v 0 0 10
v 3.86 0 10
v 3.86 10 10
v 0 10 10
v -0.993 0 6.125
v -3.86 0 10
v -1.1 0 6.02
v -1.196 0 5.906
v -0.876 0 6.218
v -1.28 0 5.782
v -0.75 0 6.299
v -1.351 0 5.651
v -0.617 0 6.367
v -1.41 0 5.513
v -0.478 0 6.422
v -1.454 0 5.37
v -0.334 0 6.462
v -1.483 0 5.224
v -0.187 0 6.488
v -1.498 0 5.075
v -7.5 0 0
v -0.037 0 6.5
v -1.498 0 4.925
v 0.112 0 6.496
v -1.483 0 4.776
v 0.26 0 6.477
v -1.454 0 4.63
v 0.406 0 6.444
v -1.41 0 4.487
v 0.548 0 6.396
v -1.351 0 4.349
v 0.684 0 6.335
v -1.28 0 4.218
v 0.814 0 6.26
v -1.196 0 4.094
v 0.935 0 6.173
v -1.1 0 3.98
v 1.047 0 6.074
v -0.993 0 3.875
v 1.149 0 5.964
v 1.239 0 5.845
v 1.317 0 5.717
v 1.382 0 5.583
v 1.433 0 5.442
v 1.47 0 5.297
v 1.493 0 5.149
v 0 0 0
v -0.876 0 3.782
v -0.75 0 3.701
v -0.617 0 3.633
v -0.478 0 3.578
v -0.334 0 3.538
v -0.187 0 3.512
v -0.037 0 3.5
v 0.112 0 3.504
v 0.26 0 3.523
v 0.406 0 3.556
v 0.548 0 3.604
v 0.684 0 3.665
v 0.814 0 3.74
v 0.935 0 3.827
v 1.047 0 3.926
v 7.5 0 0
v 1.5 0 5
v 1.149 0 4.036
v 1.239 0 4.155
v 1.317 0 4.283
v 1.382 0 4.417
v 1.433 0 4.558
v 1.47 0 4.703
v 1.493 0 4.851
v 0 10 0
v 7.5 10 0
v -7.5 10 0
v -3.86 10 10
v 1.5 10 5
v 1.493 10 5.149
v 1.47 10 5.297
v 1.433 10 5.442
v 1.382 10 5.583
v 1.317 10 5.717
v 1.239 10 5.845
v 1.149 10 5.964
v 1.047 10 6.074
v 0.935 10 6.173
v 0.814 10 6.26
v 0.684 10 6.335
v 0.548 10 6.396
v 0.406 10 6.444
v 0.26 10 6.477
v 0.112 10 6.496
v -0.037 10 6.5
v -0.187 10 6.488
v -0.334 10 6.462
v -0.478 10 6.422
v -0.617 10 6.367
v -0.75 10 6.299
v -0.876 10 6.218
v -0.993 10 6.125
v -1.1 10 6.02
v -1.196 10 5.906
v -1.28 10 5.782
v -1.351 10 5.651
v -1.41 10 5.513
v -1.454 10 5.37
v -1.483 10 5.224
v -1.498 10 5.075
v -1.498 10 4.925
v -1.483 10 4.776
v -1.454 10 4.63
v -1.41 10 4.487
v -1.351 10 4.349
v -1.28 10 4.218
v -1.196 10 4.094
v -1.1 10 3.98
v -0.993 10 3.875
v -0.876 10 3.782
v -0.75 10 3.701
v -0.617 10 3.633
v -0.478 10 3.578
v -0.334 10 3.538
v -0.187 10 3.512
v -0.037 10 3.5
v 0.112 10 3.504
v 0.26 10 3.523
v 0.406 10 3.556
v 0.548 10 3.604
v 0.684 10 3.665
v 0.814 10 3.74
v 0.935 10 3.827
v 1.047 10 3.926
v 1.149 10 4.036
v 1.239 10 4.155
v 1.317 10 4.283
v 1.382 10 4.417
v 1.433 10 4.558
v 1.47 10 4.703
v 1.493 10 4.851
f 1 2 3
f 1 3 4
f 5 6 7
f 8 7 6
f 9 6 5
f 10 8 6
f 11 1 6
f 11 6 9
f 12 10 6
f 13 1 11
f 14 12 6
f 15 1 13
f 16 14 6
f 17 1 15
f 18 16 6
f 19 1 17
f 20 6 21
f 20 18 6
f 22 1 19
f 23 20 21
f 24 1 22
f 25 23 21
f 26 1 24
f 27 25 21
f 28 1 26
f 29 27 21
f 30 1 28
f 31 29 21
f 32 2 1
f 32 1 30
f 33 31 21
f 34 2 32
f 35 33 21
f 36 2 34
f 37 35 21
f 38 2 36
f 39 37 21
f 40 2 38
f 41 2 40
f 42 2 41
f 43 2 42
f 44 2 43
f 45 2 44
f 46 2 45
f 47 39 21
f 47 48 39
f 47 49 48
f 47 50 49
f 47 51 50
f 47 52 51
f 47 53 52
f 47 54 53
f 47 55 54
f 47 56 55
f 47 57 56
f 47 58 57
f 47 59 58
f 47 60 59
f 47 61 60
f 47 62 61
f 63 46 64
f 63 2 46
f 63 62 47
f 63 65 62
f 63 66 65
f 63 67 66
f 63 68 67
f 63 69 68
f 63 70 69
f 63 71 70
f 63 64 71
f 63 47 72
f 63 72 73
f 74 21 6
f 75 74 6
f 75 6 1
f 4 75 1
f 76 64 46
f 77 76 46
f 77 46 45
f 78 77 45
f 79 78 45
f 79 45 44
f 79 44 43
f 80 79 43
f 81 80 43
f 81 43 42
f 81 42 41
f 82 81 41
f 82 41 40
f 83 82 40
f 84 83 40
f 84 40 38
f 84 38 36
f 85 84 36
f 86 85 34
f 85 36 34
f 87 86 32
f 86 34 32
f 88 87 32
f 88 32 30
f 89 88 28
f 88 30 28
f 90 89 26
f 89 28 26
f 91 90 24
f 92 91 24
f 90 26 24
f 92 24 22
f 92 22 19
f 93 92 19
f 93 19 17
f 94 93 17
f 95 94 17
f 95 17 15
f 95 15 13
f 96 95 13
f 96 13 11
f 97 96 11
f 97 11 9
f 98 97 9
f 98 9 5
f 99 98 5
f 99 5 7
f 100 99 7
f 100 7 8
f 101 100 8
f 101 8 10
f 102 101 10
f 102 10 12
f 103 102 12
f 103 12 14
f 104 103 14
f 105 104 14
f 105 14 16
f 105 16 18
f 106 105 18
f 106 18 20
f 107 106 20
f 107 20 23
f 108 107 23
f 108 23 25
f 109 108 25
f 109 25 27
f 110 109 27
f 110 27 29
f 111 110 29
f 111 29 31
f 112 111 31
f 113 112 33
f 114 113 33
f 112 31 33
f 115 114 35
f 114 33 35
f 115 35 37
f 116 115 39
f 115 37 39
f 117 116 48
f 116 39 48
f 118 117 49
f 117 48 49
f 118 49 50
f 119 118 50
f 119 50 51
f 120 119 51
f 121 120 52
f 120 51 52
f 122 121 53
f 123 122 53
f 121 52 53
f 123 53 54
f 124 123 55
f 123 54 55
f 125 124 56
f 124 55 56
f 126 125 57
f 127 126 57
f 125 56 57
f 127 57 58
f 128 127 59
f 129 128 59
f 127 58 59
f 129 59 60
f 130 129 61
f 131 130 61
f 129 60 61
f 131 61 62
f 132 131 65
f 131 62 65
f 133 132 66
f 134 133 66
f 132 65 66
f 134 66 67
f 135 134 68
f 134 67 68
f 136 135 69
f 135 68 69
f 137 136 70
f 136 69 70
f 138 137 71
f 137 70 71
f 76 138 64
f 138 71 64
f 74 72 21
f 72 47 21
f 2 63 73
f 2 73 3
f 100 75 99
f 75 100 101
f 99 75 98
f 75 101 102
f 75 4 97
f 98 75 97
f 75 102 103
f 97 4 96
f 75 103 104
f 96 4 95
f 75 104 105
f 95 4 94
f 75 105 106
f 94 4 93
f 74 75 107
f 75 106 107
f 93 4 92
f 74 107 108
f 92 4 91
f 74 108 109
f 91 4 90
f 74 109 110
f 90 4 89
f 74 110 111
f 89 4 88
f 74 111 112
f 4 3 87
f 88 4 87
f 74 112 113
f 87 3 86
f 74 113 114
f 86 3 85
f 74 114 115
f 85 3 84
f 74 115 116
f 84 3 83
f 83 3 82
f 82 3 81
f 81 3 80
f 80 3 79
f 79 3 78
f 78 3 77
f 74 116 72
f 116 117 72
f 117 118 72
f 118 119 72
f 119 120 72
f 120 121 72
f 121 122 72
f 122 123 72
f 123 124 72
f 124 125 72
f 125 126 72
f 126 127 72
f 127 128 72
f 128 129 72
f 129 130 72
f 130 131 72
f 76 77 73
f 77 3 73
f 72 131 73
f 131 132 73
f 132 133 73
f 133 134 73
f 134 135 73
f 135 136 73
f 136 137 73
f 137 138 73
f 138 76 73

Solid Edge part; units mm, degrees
sketch "Sketch1" plane through (0, 0, 0) normal (0, -1, 0) x (1, 0, 0)
  line L0 (7.5, 0) -> (3.8603, 10)
  line L1 (3.8603, 10) -> (0, 10)
  line L2 (-3.8603, 10) -> (0, 10)
  line L3 (-7.5, 0) -> (-3.8603, 10)
  line L4 (0, 0) -> (-7.5, 0)
  line L5 (0, 0) -> (7.5, 0)
  circle A0 centre (0, 5) radius 1.5
  dimension "D1" = 10
  dimension "D2" = 15
extrude "Protrusion1" add sketch "Sketch1" against normal blind 10
